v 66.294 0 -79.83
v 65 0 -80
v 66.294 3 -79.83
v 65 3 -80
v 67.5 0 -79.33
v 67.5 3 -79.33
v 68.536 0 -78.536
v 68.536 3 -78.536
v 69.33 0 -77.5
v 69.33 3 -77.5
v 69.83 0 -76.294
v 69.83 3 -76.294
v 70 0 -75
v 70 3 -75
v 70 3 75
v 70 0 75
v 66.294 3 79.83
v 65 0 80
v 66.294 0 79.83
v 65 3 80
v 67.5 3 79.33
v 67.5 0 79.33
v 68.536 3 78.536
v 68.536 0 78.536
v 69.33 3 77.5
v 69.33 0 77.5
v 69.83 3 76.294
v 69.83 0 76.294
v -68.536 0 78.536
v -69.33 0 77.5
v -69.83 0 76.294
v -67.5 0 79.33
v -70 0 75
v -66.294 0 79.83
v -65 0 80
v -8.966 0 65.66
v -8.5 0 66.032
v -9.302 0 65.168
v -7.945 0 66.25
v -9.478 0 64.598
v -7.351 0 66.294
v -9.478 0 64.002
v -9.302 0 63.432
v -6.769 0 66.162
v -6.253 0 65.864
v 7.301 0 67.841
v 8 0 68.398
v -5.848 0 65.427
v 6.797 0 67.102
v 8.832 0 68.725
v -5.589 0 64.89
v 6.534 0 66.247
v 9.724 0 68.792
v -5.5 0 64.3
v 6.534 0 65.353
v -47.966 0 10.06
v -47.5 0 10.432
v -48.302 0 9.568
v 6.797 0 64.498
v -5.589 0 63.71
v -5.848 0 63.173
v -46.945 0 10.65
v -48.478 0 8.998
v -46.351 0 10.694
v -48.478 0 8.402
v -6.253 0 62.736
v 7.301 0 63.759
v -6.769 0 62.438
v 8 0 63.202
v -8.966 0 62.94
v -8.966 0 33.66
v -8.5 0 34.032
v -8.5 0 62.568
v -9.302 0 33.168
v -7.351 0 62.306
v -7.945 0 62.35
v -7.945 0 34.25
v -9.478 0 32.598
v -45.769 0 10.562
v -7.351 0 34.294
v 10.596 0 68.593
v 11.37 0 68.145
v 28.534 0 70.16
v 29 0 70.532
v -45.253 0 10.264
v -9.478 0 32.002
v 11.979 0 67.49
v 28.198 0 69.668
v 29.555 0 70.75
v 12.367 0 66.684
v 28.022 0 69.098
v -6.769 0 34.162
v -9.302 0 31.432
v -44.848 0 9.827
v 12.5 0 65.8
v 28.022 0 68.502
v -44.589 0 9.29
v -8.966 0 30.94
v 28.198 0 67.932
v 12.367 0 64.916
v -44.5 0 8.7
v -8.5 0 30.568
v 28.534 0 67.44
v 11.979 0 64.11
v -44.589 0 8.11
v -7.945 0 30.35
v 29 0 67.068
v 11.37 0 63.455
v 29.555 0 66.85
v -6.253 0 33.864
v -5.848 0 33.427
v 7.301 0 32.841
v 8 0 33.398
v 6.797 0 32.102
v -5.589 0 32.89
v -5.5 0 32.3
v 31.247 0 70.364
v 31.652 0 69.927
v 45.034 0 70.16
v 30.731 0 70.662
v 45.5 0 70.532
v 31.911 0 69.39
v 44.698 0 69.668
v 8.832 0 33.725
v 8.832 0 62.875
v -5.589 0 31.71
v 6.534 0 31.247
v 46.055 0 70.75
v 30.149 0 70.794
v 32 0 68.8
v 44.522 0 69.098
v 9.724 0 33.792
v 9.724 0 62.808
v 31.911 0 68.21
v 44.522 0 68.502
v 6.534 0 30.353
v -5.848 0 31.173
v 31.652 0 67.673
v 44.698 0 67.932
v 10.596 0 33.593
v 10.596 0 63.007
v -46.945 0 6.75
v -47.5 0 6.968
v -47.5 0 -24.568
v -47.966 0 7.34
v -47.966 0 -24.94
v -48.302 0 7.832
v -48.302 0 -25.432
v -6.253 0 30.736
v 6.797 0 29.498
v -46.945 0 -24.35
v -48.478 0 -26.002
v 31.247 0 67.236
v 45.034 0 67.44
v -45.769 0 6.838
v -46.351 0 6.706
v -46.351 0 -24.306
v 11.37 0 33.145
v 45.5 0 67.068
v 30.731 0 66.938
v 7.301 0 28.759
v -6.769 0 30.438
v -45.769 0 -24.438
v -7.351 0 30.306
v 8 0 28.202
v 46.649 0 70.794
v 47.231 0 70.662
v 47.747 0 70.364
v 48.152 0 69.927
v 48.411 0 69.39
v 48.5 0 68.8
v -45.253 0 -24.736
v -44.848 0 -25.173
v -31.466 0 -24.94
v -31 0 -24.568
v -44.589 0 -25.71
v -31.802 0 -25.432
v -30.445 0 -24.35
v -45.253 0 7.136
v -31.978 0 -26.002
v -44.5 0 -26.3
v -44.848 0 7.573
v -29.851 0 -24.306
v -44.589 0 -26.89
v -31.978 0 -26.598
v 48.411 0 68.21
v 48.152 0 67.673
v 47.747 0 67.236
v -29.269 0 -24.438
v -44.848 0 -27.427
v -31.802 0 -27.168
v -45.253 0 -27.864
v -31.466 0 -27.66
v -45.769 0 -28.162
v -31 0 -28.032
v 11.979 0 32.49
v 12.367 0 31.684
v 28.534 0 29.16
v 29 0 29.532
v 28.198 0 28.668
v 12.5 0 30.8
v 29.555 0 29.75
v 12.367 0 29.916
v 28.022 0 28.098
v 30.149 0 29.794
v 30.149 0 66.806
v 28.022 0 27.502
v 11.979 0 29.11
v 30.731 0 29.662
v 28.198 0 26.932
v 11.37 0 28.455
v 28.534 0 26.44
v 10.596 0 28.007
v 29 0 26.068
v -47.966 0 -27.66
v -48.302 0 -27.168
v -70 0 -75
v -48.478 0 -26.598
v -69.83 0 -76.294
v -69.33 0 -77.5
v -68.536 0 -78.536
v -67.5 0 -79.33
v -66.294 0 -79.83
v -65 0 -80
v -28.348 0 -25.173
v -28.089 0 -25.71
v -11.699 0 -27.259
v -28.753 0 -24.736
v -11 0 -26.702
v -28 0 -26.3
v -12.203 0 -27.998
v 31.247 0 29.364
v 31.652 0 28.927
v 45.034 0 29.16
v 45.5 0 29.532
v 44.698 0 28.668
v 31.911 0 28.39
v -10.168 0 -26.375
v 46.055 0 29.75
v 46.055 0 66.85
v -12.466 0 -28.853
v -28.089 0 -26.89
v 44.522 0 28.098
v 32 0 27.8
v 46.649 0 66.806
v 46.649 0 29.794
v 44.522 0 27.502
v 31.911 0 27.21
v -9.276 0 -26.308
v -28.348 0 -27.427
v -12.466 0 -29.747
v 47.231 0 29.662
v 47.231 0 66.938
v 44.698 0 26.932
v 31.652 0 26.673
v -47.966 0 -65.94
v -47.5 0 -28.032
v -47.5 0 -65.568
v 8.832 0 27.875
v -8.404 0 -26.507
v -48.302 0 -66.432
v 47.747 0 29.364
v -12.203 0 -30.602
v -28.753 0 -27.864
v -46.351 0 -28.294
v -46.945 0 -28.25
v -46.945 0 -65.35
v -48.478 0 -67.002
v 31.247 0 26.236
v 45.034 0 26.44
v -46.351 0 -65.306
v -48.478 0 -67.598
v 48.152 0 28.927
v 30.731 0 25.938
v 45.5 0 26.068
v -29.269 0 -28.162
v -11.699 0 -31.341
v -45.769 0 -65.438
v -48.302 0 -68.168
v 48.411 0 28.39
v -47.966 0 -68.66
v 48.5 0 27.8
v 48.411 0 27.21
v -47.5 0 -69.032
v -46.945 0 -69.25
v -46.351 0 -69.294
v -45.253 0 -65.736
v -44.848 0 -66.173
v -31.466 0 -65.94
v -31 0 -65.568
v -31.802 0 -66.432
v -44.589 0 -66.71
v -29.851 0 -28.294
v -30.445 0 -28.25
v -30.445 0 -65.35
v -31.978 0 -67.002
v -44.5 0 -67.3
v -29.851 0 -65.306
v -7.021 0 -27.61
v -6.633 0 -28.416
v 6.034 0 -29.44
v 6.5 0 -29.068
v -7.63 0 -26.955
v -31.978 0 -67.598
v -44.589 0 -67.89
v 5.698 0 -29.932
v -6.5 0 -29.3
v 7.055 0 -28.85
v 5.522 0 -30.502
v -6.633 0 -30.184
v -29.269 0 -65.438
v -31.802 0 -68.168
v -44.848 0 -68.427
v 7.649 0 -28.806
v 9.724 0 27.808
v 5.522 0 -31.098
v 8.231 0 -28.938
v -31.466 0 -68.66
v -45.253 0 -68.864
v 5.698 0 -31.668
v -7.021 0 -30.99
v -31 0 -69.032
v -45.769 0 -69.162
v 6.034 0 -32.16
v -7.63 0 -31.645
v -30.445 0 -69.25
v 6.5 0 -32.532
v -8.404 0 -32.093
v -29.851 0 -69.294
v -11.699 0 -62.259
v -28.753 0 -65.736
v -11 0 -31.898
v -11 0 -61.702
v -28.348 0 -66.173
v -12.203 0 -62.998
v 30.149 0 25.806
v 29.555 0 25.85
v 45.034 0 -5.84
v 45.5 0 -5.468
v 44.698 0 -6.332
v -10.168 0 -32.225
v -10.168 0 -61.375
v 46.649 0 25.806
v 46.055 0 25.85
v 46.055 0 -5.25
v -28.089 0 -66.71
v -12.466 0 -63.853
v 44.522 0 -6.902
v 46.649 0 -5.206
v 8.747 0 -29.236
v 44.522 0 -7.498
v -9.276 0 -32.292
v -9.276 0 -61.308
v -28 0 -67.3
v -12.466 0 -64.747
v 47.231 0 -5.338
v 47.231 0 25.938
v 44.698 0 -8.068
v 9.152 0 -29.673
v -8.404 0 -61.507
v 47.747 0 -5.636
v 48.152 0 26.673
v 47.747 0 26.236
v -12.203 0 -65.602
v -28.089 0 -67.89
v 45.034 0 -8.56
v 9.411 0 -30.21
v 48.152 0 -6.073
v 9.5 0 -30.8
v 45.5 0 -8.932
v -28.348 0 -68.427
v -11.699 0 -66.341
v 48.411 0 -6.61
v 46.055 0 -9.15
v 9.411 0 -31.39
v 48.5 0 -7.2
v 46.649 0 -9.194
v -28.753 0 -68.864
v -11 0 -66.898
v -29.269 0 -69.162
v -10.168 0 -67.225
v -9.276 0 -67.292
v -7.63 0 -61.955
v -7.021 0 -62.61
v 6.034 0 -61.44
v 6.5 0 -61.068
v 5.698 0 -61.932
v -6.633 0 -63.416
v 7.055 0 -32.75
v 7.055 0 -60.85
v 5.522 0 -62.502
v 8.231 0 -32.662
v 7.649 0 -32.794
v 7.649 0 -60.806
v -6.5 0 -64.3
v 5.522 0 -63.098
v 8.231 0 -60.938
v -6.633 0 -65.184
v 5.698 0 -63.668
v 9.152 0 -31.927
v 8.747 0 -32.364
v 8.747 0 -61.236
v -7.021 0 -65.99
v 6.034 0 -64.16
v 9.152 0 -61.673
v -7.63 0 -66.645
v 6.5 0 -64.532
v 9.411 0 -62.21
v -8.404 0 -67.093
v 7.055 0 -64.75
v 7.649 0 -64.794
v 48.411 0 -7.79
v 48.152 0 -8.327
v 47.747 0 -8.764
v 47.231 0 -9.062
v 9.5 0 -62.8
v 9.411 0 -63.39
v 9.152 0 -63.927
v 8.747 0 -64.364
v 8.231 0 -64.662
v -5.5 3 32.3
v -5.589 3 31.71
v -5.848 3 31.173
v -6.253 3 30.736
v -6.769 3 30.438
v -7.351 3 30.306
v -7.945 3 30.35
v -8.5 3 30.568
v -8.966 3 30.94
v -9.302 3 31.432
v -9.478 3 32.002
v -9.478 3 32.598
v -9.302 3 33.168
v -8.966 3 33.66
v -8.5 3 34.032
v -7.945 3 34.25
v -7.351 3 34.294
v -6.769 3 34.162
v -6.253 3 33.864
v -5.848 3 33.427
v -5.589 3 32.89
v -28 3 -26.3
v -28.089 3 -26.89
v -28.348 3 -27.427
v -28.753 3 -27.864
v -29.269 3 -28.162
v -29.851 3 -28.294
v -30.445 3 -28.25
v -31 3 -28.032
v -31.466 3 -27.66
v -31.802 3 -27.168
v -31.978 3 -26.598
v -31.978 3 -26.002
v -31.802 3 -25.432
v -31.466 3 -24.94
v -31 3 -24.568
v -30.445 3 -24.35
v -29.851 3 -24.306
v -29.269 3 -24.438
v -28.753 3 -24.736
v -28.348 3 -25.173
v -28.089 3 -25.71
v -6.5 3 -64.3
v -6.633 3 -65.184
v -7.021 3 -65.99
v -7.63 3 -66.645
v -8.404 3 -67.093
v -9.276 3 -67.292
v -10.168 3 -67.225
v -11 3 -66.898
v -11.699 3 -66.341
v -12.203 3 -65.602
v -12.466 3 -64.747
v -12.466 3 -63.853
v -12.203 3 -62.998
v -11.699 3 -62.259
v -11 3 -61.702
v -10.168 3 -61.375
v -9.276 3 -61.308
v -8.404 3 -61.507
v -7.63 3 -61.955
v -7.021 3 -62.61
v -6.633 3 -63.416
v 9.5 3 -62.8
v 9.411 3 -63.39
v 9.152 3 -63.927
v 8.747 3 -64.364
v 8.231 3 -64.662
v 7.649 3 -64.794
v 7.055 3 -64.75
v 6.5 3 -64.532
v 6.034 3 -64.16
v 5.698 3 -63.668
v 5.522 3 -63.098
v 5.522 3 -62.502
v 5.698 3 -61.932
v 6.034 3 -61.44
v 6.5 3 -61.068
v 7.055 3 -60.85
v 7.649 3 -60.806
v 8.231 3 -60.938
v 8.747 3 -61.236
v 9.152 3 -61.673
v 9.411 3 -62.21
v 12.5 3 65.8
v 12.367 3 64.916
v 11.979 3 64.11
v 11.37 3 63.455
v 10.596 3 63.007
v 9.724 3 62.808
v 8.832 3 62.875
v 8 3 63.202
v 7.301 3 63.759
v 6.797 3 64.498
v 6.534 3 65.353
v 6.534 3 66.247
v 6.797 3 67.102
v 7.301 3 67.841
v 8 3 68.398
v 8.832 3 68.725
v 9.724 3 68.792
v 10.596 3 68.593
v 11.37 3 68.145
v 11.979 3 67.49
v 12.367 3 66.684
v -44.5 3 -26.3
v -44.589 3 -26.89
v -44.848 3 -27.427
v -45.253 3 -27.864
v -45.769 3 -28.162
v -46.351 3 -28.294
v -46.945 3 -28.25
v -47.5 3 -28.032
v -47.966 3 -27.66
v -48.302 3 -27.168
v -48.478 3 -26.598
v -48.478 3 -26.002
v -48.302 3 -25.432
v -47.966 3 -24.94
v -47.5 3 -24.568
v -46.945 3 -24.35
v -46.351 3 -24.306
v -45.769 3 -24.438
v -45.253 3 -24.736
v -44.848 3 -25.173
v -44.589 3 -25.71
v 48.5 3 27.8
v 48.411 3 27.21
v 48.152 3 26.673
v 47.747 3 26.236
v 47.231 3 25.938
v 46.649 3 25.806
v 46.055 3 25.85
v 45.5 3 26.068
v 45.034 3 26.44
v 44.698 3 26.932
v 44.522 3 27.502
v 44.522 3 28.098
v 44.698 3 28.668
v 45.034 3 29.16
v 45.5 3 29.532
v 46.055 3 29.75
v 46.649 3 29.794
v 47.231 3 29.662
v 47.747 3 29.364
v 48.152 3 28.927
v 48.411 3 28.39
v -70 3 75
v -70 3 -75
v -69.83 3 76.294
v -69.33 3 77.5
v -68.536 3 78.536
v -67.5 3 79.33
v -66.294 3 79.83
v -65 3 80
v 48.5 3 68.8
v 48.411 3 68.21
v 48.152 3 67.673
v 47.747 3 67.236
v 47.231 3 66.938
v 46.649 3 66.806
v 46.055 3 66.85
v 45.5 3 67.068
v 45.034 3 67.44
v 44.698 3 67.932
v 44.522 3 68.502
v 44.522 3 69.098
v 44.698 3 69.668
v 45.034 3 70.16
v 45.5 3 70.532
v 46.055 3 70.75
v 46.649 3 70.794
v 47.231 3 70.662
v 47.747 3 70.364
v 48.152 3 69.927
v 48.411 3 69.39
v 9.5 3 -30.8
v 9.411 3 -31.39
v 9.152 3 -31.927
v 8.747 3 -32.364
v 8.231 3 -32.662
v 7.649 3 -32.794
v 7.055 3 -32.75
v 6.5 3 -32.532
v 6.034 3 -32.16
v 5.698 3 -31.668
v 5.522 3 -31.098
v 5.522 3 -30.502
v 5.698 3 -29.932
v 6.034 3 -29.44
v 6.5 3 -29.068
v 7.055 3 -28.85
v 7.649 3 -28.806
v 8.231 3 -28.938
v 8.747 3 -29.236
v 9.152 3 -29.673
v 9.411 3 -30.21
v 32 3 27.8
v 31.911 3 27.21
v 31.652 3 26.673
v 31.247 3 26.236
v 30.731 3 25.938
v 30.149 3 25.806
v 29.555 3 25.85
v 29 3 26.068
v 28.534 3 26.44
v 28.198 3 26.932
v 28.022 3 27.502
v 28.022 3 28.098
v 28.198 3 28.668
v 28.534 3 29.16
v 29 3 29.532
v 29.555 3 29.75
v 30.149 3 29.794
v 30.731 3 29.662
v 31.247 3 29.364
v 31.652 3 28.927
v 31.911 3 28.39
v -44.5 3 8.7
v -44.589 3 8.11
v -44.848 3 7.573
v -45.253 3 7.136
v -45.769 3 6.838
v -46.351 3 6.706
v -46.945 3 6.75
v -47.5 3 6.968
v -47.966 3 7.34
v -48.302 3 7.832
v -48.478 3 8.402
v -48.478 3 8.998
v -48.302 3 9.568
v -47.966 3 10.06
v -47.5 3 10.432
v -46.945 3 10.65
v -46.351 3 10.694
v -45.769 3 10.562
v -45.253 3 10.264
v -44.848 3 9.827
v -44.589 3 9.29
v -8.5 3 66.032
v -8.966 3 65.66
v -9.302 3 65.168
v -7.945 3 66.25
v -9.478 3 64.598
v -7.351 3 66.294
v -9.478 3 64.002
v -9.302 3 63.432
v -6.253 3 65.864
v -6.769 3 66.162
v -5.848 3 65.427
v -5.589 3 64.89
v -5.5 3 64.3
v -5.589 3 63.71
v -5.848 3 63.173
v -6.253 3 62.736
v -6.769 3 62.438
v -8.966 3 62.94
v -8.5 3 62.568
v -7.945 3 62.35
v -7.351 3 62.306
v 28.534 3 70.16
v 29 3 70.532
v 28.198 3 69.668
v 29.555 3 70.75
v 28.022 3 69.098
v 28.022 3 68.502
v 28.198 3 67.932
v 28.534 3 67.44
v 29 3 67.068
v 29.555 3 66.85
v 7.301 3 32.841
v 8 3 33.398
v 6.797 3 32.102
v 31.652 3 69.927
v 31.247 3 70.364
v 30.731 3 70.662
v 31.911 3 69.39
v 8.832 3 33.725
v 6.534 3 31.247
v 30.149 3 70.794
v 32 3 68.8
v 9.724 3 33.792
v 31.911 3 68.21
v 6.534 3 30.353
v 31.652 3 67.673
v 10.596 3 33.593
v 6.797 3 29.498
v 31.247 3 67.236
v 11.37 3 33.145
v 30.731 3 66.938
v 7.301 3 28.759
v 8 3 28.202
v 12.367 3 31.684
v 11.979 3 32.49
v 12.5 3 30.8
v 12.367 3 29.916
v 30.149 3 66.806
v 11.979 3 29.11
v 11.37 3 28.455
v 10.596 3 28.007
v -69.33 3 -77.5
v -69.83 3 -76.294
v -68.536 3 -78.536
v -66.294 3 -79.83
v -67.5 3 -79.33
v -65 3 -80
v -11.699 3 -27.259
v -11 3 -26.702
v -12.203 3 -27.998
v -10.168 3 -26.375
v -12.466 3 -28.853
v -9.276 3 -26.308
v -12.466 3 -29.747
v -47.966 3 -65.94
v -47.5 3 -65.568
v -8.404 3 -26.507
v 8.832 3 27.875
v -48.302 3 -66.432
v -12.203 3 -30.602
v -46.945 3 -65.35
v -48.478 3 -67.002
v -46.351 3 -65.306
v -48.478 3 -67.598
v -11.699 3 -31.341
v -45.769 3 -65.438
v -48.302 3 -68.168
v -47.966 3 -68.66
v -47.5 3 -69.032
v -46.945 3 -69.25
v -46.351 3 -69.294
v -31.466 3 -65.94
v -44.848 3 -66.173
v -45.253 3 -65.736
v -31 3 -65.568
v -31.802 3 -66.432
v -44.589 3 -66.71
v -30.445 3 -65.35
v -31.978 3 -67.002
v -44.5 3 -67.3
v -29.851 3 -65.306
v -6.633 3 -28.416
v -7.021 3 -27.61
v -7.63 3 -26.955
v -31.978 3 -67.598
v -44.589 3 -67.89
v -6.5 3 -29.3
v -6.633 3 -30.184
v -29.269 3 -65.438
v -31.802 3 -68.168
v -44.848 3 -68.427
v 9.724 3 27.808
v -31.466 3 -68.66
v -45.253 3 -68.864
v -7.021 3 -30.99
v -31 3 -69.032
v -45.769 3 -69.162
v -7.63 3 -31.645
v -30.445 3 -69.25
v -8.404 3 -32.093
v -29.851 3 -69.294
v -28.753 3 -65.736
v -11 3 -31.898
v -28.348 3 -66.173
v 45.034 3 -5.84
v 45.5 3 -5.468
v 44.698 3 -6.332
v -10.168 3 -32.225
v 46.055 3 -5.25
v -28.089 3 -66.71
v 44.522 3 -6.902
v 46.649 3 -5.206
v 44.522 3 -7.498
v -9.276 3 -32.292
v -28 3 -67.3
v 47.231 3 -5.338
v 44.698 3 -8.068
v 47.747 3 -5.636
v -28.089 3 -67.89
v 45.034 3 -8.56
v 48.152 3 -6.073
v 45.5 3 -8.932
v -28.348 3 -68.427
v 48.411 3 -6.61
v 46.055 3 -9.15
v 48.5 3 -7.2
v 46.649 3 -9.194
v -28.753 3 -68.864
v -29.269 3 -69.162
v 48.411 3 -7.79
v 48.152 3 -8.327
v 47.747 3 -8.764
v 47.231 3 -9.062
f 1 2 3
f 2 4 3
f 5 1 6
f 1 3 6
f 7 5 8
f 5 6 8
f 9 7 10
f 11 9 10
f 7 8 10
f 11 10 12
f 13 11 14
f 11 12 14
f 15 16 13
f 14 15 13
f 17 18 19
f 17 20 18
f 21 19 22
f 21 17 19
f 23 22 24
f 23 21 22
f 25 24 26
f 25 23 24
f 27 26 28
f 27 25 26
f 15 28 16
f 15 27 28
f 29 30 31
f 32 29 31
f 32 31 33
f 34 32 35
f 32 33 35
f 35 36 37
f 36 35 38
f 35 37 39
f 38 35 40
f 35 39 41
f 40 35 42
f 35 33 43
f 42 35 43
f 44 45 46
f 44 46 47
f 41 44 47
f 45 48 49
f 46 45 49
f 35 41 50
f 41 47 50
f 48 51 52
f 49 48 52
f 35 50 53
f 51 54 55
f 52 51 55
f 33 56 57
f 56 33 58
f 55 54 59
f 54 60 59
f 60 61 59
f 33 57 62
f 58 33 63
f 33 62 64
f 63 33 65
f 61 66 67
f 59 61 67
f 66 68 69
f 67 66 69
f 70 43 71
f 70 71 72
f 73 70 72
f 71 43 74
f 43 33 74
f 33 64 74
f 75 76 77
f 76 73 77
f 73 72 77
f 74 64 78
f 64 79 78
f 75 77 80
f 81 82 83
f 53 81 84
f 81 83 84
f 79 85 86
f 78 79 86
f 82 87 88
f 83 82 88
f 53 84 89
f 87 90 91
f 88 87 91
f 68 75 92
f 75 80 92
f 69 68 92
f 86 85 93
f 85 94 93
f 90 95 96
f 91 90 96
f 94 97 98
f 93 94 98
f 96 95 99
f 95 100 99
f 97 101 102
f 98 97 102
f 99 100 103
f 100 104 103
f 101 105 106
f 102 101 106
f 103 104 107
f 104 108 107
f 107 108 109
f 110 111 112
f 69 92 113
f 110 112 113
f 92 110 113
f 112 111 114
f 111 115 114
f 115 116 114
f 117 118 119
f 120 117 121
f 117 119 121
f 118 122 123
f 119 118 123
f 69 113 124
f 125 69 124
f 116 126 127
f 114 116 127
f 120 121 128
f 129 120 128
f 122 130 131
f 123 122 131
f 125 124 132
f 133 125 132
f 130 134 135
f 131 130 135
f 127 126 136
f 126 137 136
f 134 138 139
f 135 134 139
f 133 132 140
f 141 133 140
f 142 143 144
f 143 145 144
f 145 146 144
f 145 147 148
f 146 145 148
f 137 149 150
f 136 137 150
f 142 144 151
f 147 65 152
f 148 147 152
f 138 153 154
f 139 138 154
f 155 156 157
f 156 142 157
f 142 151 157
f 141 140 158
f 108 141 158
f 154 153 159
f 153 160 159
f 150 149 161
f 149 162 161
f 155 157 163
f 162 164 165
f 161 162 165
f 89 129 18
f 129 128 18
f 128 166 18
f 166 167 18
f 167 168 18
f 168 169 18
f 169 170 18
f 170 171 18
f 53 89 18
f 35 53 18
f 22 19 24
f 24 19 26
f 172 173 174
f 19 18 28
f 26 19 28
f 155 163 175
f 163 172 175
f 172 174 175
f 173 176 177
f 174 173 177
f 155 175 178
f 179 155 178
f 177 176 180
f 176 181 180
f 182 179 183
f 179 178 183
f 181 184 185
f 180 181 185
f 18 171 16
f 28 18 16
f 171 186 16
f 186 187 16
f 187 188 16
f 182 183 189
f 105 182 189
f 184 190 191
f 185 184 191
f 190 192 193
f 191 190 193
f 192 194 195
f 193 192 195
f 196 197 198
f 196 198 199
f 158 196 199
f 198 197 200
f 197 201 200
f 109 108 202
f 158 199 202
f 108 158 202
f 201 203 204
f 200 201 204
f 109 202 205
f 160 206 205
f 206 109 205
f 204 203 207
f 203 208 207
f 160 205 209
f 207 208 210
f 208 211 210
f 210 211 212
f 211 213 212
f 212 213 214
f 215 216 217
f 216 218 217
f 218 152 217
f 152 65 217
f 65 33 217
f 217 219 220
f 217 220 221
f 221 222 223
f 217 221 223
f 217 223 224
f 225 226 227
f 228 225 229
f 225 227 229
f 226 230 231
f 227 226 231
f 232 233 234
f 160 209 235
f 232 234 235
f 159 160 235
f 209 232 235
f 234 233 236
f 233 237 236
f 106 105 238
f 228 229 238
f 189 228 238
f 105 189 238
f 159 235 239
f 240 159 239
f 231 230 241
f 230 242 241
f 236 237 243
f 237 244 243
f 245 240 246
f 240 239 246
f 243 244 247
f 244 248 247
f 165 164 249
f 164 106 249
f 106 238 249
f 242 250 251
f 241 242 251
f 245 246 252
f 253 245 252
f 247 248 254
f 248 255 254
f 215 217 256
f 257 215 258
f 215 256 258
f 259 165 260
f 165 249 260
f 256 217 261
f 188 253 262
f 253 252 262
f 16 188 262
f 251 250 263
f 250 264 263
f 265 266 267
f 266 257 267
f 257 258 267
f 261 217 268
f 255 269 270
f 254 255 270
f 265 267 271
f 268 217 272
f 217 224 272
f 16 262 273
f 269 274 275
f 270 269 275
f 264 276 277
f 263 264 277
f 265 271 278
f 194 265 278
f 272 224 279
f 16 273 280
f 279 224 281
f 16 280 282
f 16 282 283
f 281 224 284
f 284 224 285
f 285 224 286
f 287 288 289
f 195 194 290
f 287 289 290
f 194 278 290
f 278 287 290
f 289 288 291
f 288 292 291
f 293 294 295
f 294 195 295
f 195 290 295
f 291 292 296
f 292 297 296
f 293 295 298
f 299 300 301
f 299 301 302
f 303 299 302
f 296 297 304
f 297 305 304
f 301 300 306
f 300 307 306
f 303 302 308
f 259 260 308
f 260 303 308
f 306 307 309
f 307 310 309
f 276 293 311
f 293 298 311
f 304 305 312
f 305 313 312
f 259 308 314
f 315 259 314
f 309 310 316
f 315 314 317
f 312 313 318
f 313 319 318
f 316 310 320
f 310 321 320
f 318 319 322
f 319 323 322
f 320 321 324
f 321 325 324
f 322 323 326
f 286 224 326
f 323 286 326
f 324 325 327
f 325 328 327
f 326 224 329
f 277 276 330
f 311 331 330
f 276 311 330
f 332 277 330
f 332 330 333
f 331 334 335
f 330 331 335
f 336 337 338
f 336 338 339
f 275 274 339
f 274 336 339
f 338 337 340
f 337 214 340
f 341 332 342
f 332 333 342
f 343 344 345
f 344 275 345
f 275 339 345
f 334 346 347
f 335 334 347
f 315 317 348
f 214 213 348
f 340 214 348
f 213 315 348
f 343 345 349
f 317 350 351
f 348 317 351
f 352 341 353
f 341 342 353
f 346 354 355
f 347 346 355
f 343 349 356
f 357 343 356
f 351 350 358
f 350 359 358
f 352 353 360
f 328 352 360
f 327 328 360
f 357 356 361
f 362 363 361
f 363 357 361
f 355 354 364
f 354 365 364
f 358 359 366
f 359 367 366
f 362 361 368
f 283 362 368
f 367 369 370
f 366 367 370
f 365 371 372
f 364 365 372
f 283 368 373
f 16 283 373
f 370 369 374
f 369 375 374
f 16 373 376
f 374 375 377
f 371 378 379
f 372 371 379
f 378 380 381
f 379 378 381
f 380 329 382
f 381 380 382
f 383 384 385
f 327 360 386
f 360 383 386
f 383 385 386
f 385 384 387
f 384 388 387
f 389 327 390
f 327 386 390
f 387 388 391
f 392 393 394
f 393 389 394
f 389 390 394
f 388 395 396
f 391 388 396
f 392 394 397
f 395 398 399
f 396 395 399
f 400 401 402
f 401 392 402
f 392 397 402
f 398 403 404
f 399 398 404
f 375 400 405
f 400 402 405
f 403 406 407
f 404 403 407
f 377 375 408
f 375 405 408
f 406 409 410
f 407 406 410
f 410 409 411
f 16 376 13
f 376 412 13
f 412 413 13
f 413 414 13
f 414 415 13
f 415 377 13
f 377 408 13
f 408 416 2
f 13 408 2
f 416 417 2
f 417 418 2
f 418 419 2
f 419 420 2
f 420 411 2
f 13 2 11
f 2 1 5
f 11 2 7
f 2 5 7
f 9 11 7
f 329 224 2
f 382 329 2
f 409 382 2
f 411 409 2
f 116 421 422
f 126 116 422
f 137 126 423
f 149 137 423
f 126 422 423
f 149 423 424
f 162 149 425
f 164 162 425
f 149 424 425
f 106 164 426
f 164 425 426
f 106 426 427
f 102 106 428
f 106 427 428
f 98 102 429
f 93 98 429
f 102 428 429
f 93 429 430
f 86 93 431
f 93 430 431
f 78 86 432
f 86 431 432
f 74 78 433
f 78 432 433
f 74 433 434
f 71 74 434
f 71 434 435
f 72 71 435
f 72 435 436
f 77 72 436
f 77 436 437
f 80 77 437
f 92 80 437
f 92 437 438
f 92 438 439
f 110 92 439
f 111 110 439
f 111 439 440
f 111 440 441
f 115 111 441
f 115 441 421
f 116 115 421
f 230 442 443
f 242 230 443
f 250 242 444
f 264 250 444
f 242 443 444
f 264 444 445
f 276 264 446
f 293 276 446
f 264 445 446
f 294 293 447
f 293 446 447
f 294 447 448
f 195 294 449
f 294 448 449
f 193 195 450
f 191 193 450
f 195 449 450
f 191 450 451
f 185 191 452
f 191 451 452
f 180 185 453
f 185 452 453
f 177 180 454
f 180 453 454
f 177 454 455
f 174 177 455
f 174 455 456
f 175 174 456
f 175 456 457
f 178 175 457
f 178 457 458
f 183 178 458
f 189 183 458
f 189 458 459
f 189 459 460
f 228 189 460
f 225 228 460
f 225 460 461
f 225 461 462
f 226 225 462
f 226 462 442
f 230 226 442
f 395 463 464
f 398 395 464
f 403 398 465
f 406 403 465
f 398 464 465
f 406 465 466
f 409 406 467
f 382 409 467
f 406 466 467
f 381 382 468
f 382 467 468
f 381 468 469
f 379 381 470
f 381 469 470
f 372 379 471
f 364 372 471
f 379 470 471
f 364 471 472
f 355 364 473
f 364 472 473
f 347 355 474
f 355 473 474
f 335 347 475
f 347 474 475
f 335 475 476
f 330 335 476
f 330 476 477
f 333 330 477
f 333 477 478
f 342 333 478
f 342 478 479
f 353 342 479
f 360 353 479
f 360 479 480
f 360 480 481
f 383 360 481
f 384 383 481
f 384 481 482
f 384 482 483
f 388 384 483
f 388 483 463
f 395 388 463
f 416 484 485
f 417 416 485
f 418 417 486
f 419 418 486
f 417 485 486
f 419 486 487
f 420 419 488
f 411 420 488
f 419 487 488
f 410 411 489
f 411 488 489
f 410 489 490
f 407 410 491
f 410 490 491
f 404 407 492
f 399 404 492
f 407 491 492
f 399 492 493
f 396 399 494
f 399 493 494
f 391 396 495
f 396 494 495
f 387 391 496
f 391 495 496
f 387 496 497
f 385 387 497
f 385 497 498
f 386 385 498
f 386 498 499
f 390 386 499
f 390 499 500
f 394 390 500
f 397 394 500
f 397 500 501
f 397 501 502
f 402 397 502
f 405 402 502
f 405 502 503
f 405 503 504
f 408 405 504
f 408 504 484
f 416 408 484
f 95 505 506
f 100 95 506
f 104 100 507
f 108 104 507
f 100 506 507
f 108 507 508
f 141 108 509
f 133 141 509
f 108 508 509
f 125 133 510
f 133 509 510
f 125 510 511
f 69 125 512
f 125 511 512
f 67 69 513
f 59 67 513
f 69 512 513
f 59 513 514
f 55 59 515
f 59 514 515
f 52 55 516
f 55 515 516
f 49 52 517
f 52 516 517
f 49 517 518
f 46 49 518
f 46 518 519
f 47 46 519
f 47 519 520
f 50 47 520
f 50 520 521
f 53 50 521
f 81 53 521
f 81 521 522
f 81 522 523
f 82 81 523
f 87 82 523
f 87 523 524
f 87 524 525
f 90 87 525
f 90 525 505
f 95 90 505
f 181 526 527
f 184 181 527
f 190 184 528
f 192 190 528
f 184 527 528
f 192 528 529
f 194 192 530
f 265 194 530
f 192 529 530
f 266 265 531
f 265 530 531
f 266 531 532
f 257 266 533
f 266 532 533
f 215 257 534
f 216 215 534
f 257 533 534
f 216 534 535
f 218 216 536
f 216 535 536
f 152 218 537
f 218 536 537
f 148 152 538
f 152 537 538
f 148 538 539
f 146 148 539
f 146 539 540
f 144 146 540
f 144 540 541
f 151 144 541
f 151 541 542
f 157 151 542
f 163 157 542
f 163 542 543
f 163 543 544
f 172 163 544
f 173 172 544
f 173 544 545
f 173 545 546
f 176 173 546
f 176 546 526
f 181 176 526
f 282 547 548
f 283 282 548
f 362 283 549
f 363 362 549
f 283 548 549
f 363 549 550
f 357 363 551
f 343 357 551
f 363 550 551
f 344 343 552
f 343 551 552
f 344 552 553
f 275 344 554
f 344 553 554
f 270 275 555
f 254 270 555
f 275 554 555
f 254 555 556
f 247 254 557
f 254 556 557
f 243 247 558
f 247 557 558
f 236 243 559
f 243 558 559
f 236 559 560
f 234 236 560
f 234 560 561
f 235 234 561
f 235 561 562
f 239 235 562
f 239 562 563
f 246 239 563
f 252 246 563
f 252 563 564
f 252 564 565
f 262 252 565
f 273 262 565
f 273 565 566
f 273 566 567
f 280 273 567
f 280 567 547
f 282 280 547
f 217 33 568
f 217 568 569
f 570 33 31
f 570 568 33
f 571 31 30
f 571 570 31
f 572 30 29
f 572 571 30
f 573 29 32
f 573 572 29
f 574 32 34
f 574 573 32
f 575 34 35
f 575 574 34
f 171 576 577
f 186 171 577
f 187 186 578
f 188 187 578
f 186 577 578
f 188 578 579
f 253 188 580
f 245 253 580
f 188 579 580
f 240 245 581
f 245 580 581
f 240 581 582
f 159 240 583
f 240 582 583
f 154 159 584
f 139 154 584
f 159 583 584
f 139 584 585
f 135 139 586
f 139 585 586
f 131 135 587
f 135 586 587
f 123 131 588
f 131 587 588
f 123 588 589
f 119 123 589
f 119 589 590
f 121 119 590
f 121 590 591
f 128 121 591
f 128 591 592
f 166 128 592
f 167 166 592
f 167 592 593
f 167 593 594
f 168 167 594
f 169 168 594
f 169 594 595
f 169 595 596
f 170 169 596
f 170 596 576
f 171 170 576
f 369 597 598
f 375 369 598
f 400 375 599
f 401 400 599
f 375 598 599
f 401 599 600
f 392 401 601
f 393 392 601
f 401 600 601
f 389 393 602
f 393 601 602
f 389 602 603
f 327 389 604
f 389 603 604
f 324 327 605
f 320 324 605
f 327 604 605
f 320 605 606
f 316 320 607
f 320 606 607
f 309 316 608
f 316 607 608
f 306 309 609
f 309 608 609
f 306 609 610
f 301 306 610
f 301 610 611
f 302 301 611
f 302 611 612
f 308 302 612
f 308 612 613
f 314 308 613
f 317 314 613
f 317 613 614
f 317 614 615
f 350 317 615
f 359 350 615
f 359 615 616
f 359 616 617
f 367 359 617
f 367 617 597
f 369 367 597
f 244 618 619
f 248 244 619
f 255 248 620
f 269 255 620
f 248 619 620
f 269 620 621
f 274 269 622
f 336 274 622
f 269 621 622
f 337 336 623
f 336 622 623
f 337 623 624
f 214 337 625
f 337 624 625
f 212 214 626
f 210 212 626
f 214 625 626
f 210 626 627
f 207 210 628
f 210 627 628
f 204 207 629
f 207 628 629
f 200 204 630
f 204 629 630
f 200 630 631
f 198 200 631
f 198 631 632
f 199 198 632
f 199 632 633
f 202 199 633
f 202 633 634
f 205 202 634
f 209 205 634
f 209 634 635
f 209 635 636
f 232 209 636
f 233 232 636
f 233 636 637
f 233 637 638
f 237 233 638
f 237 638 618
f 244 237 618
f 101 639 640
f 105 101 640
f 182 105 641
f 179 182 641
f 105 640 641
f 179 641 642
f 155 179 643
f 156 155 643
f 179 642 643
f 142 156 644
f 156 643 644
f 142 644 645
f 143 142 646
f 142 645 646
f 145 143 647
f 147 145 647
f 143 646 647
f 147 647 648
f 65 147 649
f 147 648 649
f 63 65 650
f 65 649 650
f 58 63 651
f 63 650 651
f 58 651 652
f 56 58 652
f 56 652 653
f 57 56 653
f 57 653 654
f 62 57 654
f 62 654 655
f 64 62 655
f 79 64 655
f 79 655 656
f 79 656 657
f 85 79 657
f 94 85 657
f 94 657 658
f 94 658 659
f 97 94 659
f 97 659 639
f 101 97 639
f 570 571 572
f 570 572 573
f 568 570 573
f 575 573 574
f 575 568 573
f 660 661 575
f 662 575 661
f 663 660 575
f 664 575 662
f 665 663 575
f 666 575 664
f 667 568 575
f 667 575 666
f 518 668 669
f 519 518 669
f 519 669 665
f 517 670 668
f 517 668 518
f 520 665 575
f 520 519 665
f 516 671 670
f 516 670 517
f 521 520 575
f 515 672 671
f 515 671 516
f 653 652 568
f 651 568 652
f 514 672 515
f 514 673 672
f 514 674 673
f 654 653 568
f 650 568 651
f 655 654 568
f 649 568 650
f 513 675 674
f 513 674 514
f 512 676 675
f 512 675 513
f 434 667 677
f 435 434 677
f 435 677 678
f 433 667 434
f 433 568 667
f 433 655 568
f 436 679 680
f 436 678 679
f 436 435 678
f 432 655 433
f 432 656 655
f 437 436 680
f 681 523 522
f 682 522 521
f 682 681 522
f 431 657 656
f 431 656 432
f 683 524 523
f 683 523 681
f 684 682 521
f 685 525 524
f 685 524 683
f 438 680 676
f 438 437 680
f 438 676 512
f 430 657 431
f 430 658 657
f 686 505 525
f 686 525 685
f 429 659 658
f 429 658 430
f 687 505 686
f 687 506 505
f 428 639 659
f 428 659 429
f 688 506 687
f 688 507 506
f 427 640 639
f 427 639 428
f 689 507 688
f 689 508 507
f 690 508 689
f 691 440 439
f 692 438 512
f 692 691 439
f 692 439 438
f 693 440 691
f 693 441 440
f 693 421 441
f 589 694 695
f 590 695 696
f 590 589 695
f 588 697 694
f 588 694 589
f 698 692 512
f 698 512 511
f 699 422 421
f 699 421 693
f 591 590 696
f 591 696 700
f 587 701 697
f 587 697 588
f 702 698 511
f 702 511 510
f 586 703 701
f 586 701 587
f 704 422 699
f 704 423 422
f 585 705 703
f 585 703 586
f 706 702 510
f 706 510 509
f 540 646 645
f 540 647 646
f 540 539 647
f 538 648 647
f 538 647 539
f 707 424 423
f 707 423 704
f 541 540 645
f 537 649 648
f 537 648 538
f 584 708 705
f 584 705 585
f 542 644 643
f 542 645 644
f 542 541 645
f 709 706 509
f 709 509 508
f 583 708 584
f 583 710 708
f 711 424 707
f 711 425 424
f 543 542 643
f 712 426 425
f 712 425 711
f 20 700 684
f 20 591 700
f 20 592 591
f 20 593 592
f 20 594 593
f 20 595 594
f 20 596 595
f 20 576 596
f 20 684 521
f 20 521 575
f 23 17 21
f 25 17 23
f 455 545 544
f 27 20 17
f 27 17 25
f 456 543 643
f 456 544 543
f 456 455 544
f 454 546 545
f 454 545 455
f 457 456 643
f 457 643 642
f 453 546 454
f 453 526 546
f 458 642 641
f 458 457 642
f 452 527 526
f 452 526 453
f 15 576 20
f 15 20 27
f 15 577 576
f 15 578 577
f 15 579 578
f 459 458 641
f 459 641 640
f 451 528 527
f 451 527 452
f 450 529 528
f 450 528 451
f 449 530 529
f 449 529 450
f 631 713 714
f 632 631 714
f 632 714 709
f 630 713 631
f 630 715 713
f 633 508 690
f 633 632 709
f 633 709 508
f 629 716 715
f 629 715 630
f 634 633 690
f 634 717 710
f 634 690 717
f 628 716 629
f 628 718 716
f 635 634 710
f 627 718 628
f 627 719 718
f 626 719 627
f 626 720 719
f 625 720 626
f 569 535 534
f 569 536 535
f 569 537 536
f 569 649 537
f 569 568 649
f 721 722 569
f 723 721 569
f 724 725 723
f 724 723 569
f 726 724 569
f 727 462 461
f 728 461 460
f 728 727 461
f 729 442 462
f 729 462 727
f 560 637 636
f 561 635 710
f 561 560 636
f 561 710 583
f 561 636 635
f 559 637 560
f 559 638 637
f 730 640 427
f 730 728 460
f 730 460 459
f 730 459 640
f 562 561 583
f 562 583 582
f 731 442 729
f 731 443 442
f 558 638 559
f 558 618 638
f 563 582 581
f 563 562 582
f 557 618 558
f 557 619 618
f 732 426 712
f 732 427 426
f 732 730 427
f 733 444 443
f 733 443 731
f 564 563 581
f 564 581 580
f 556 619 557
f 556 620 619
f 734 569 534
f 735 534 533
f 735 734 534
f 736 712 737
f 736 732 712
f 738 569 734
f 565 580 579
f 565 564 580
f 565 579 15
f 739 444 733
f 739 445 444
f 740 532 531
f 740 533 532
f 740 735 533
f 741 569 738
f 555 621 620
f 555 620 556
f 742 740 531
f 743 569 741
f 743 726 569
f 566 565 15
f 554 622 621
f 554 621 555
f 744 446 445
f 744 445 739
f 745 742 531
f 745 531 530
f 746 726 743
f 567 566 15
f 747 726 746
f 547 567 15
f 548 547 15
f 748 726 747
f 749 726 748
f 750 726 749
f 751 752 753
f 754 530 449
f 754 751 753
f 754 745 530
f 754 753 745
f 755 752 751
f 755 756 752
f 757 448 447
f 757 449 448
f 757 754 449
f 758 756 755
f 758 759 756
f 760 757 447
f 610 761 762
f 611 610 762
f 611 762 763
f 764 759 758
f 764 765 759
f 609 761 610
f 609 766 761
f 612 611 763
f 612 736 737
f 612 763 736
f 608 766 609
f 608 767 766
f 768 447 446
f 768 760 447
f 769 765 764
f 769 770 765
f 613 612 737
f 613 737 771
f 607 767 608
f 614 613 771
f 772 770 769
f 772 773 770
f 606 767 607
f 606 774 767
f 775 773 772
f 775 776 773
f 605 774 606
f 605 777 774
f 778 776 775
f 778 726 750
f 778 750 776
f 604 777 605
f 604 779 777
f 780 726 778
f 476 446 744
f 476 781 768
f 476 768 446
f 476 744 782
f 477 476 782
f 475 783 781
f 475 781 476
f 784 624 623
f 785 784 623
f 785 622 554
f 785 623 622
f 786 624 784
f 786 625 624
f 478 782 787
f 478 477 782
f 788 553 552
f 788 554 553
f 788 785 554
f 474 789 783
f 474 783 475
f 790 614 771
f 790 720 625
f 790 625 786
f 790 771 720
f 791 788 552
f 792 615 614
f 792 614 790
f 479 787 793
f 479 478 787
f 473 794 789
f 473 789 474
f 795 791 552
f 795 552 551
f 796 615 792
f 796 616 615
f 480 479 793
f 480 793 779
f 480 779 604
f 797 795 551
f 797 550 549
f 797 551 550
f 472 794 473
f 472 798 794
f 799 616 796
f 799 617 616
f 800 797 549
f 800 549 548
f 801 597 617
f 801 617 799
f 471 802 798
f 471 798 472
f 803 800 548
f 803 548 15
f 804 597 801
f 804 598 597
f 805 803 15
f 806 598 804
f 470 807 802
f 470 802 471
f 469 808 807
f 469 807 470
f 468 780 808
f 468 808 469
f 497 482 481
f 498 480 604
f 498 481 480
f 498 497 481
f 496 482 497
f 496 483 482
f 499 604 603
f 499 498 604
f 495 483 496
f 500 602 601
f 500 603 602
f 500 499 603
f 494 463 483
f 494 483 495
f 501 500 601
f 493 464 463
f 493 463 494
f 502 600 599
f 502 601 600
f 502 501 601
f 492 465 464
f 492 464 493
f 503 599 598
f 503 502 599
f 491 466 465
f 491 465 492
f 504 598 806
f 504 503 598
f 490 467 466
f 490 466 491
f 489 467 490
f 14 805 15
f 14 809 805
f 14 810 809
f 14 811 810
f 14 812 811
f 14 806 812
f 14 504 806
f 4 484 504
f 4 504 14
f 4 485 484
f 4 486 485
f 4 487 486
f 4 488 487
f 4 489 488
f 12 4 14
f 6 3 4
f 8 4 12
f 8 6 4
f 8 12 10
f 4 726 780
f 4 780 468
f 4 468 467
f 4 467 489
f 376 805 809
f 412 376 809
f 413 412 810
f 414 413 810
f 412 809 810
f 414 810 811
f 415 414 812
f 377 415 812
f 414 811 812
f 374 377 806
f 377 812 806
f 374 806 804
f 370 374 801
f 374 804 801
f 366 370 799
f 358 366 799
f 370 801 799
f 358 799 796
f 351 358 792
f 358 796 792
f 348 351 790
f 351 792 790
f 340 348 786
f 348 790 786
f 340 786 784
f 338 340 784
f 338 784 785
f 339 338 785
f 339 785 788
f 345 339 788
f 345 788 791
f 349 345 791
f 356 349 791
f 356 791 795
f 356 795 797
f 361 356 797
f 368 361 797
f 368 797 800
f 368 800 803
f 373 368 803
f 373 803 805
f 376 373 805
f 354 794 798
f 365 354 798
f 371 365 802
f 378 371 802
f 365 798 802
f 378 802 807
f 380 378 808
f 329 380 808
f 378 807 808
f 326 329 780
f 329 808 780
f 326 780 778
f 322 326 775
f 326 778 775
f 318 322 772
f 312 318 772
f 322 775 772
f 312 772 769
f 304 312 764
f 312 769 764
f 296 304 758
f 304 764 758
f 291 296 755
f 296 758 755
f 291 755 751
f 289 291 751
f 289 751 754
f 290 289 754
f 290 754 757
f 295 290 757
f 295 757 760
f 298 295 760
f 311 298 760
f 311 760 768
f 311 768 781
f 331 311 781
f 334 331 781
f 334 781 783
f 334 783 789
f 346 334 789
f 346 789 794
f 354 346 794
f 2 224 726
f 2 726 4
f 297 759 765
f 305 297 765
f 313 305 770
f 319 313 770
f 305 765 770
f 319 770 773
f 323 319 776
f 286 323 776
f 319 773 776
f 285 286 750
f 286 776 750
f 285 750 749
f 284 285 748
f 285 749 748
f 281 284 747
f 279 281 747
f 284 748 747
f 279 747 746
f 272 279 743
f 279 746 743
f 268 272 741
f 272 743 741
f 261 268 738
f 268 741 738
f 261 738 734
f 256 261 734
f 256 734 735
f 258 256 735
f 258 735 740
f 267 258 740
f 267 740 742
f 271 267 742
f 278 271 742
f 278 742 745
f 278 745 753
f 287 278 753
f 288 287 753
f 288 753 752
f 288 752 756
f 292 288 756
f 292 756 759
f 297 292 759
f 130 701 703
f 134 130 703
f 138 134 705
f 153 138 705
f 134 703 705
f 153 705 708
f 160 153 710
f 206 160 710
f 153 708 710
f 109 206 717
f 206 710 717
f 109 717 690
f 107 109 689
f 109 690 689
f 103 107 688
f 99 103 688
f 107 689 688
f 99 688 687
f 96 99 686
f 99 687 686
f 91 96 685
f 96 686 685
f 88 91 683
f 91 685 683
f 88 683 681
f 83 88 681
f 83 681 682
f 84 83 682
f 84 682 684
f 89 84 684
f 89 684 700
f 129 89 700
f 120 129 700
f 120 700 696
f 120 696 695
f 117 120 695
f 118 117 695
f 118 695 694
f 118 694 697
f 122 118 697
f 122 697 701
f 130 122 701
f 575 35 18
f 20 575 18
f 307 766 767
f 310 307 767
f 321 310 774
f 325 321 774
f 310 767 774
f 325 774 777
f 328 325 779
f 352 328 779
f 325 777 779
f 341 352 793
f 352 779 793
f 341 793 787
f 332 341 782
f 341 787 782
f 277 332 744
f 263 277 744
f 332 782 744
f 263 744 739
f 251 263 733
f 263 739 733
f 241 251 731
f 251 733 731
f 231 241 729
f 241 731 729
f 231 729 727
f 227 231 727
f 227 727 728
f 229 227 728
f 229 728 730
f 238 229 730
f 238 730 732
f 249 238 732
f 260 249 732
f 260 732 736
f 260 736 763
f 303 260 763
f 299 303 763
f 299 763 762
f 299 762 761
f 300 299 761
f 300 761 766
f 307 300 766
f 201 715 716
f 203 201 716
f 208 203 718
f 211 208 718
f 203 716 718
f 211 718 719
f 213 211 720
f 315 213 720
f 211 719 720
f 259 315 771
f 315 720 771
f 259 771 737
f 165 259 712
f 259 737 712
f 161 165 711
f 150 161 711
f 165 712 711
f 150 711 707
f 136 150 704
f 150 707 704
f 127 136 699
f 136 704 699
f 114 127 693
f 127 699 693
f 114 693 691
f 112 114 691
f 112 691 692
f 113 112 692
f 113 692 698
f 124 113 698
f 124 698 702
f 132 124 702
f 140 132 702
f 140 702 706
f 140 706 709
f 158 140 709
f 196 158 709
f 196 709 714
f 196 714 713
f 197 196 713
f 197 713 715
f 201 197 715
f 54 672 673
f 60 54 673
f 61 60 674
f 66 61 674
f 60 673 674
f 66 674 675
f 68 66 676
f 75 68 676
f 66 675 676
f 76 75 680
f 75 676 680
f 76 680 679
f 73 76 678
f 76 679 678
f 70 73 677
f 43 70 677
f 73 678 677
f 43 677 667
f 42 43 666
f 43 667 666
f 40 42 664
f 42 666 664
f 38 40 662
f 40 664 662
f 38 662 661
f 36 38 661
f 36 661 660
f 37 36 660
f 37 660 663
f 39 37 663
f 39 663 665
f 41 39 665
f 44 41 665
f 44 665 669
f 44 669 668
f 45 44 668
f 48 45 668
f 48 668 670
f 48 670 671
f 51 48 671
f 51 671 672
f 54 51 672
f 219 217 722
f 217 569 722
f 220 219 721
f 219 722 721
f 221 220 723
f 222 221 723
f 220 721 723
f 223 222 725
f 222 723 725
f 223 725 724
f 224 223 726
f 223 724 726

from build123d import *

# Parameters (mm, degrees)
SKETCH1_W           = 140
SKETCH1_H           = 160
BOSS_EXTRUDE1_DEPTH = 3
SKETCH2_R           = 2
SKETCH2_R_2         = 3
CUT_EXTRUDE1_DEPTH  = 4
FILLET1_R           = 5


with BuildPart() as part:
    # Sketch1 → Boss-Extrude1 (new body)
    with BuildSketch(Plane(origin=(0, 0, 0), x_dir=(1, 0, 0), z_dir=(0, 1, 0))):
        Rectangle(SKETCH1_W, SKETCH1_H)
    extrude(amount=BOSS_EXTRUDE1_DEPTH)

    # Sketch2 → Cut-Extrude1 (cut, through all)
    with BuildSketch(Plane(origin=(0, 3, 0), x_dir=(1, 0, 0), z_dir=(0, 1, 0))):
        with Locations((-30, 26.3)):
            Circle(SKETCH2_R)
        with Locations((-30, 67.3)):
            Circle(SKETCH2_R)
        with Locations((7.5, 62.8)):
            Circle(SKETCH2_R)
        with Locations((7.5, 30.8)):
            Circle(SKETCH2_R)
        with Locations((30, -68.8)):
            Circle(SKETCH2_R)
        with Locations((-7.5, -64.3)):
            Circle(SKETCH2_R)
        with Locations((30, -27.8)):
            Circle(SKETCH2_R)
        with Locations((-7.5, -32.3)):
            Circle(SKETCH2_R)
        with Locations((46.5, -27.8)):
            Circle(SKETCH2_R)
        with Locations((46.5, -68.8)):
            Circle(SKETCH2_R)
        with Locations((-46.5, 26.3)):
            Circle(SKETCH2_R)
        with Locations((-46.5, 67.3)):
            Circle(SKETCH2_R)
        with Locations((46.5, 7.2)):
            Circle(SKETCH2_R)
        with Locations((-46.5, -8.7)):
            Circle(SKETCH2_R)
        with Locations((9.5, -65.8)):
            Circle(SKETCH2_R_2)
        with Locations((9.5, -30.8)):
            Circle(SKETCH2_R_2)
        with Locations((-9.5, 64.3)):
            Circle(SKETCH2_R_2)
        with Locations((-9.5, 29.3)):
            Circle(SKETCH2_R_2)
    extrude(amount=-CUT_EXTRUDE1_DEPTH, mode=Mode.SUBTRACT)

    # Fillet1
    fillet1_edges = [part.edges().sort_by_distance(p)[0] for p in [
        (-70, 1.5, -80),
        (70, 1.5, -80),
        (70, 1.5, 80),
        (-70, 1.5, 80),
    ]]
    fillet(fillet1_edges, radius=FILLET1_R)


solid = part.part
